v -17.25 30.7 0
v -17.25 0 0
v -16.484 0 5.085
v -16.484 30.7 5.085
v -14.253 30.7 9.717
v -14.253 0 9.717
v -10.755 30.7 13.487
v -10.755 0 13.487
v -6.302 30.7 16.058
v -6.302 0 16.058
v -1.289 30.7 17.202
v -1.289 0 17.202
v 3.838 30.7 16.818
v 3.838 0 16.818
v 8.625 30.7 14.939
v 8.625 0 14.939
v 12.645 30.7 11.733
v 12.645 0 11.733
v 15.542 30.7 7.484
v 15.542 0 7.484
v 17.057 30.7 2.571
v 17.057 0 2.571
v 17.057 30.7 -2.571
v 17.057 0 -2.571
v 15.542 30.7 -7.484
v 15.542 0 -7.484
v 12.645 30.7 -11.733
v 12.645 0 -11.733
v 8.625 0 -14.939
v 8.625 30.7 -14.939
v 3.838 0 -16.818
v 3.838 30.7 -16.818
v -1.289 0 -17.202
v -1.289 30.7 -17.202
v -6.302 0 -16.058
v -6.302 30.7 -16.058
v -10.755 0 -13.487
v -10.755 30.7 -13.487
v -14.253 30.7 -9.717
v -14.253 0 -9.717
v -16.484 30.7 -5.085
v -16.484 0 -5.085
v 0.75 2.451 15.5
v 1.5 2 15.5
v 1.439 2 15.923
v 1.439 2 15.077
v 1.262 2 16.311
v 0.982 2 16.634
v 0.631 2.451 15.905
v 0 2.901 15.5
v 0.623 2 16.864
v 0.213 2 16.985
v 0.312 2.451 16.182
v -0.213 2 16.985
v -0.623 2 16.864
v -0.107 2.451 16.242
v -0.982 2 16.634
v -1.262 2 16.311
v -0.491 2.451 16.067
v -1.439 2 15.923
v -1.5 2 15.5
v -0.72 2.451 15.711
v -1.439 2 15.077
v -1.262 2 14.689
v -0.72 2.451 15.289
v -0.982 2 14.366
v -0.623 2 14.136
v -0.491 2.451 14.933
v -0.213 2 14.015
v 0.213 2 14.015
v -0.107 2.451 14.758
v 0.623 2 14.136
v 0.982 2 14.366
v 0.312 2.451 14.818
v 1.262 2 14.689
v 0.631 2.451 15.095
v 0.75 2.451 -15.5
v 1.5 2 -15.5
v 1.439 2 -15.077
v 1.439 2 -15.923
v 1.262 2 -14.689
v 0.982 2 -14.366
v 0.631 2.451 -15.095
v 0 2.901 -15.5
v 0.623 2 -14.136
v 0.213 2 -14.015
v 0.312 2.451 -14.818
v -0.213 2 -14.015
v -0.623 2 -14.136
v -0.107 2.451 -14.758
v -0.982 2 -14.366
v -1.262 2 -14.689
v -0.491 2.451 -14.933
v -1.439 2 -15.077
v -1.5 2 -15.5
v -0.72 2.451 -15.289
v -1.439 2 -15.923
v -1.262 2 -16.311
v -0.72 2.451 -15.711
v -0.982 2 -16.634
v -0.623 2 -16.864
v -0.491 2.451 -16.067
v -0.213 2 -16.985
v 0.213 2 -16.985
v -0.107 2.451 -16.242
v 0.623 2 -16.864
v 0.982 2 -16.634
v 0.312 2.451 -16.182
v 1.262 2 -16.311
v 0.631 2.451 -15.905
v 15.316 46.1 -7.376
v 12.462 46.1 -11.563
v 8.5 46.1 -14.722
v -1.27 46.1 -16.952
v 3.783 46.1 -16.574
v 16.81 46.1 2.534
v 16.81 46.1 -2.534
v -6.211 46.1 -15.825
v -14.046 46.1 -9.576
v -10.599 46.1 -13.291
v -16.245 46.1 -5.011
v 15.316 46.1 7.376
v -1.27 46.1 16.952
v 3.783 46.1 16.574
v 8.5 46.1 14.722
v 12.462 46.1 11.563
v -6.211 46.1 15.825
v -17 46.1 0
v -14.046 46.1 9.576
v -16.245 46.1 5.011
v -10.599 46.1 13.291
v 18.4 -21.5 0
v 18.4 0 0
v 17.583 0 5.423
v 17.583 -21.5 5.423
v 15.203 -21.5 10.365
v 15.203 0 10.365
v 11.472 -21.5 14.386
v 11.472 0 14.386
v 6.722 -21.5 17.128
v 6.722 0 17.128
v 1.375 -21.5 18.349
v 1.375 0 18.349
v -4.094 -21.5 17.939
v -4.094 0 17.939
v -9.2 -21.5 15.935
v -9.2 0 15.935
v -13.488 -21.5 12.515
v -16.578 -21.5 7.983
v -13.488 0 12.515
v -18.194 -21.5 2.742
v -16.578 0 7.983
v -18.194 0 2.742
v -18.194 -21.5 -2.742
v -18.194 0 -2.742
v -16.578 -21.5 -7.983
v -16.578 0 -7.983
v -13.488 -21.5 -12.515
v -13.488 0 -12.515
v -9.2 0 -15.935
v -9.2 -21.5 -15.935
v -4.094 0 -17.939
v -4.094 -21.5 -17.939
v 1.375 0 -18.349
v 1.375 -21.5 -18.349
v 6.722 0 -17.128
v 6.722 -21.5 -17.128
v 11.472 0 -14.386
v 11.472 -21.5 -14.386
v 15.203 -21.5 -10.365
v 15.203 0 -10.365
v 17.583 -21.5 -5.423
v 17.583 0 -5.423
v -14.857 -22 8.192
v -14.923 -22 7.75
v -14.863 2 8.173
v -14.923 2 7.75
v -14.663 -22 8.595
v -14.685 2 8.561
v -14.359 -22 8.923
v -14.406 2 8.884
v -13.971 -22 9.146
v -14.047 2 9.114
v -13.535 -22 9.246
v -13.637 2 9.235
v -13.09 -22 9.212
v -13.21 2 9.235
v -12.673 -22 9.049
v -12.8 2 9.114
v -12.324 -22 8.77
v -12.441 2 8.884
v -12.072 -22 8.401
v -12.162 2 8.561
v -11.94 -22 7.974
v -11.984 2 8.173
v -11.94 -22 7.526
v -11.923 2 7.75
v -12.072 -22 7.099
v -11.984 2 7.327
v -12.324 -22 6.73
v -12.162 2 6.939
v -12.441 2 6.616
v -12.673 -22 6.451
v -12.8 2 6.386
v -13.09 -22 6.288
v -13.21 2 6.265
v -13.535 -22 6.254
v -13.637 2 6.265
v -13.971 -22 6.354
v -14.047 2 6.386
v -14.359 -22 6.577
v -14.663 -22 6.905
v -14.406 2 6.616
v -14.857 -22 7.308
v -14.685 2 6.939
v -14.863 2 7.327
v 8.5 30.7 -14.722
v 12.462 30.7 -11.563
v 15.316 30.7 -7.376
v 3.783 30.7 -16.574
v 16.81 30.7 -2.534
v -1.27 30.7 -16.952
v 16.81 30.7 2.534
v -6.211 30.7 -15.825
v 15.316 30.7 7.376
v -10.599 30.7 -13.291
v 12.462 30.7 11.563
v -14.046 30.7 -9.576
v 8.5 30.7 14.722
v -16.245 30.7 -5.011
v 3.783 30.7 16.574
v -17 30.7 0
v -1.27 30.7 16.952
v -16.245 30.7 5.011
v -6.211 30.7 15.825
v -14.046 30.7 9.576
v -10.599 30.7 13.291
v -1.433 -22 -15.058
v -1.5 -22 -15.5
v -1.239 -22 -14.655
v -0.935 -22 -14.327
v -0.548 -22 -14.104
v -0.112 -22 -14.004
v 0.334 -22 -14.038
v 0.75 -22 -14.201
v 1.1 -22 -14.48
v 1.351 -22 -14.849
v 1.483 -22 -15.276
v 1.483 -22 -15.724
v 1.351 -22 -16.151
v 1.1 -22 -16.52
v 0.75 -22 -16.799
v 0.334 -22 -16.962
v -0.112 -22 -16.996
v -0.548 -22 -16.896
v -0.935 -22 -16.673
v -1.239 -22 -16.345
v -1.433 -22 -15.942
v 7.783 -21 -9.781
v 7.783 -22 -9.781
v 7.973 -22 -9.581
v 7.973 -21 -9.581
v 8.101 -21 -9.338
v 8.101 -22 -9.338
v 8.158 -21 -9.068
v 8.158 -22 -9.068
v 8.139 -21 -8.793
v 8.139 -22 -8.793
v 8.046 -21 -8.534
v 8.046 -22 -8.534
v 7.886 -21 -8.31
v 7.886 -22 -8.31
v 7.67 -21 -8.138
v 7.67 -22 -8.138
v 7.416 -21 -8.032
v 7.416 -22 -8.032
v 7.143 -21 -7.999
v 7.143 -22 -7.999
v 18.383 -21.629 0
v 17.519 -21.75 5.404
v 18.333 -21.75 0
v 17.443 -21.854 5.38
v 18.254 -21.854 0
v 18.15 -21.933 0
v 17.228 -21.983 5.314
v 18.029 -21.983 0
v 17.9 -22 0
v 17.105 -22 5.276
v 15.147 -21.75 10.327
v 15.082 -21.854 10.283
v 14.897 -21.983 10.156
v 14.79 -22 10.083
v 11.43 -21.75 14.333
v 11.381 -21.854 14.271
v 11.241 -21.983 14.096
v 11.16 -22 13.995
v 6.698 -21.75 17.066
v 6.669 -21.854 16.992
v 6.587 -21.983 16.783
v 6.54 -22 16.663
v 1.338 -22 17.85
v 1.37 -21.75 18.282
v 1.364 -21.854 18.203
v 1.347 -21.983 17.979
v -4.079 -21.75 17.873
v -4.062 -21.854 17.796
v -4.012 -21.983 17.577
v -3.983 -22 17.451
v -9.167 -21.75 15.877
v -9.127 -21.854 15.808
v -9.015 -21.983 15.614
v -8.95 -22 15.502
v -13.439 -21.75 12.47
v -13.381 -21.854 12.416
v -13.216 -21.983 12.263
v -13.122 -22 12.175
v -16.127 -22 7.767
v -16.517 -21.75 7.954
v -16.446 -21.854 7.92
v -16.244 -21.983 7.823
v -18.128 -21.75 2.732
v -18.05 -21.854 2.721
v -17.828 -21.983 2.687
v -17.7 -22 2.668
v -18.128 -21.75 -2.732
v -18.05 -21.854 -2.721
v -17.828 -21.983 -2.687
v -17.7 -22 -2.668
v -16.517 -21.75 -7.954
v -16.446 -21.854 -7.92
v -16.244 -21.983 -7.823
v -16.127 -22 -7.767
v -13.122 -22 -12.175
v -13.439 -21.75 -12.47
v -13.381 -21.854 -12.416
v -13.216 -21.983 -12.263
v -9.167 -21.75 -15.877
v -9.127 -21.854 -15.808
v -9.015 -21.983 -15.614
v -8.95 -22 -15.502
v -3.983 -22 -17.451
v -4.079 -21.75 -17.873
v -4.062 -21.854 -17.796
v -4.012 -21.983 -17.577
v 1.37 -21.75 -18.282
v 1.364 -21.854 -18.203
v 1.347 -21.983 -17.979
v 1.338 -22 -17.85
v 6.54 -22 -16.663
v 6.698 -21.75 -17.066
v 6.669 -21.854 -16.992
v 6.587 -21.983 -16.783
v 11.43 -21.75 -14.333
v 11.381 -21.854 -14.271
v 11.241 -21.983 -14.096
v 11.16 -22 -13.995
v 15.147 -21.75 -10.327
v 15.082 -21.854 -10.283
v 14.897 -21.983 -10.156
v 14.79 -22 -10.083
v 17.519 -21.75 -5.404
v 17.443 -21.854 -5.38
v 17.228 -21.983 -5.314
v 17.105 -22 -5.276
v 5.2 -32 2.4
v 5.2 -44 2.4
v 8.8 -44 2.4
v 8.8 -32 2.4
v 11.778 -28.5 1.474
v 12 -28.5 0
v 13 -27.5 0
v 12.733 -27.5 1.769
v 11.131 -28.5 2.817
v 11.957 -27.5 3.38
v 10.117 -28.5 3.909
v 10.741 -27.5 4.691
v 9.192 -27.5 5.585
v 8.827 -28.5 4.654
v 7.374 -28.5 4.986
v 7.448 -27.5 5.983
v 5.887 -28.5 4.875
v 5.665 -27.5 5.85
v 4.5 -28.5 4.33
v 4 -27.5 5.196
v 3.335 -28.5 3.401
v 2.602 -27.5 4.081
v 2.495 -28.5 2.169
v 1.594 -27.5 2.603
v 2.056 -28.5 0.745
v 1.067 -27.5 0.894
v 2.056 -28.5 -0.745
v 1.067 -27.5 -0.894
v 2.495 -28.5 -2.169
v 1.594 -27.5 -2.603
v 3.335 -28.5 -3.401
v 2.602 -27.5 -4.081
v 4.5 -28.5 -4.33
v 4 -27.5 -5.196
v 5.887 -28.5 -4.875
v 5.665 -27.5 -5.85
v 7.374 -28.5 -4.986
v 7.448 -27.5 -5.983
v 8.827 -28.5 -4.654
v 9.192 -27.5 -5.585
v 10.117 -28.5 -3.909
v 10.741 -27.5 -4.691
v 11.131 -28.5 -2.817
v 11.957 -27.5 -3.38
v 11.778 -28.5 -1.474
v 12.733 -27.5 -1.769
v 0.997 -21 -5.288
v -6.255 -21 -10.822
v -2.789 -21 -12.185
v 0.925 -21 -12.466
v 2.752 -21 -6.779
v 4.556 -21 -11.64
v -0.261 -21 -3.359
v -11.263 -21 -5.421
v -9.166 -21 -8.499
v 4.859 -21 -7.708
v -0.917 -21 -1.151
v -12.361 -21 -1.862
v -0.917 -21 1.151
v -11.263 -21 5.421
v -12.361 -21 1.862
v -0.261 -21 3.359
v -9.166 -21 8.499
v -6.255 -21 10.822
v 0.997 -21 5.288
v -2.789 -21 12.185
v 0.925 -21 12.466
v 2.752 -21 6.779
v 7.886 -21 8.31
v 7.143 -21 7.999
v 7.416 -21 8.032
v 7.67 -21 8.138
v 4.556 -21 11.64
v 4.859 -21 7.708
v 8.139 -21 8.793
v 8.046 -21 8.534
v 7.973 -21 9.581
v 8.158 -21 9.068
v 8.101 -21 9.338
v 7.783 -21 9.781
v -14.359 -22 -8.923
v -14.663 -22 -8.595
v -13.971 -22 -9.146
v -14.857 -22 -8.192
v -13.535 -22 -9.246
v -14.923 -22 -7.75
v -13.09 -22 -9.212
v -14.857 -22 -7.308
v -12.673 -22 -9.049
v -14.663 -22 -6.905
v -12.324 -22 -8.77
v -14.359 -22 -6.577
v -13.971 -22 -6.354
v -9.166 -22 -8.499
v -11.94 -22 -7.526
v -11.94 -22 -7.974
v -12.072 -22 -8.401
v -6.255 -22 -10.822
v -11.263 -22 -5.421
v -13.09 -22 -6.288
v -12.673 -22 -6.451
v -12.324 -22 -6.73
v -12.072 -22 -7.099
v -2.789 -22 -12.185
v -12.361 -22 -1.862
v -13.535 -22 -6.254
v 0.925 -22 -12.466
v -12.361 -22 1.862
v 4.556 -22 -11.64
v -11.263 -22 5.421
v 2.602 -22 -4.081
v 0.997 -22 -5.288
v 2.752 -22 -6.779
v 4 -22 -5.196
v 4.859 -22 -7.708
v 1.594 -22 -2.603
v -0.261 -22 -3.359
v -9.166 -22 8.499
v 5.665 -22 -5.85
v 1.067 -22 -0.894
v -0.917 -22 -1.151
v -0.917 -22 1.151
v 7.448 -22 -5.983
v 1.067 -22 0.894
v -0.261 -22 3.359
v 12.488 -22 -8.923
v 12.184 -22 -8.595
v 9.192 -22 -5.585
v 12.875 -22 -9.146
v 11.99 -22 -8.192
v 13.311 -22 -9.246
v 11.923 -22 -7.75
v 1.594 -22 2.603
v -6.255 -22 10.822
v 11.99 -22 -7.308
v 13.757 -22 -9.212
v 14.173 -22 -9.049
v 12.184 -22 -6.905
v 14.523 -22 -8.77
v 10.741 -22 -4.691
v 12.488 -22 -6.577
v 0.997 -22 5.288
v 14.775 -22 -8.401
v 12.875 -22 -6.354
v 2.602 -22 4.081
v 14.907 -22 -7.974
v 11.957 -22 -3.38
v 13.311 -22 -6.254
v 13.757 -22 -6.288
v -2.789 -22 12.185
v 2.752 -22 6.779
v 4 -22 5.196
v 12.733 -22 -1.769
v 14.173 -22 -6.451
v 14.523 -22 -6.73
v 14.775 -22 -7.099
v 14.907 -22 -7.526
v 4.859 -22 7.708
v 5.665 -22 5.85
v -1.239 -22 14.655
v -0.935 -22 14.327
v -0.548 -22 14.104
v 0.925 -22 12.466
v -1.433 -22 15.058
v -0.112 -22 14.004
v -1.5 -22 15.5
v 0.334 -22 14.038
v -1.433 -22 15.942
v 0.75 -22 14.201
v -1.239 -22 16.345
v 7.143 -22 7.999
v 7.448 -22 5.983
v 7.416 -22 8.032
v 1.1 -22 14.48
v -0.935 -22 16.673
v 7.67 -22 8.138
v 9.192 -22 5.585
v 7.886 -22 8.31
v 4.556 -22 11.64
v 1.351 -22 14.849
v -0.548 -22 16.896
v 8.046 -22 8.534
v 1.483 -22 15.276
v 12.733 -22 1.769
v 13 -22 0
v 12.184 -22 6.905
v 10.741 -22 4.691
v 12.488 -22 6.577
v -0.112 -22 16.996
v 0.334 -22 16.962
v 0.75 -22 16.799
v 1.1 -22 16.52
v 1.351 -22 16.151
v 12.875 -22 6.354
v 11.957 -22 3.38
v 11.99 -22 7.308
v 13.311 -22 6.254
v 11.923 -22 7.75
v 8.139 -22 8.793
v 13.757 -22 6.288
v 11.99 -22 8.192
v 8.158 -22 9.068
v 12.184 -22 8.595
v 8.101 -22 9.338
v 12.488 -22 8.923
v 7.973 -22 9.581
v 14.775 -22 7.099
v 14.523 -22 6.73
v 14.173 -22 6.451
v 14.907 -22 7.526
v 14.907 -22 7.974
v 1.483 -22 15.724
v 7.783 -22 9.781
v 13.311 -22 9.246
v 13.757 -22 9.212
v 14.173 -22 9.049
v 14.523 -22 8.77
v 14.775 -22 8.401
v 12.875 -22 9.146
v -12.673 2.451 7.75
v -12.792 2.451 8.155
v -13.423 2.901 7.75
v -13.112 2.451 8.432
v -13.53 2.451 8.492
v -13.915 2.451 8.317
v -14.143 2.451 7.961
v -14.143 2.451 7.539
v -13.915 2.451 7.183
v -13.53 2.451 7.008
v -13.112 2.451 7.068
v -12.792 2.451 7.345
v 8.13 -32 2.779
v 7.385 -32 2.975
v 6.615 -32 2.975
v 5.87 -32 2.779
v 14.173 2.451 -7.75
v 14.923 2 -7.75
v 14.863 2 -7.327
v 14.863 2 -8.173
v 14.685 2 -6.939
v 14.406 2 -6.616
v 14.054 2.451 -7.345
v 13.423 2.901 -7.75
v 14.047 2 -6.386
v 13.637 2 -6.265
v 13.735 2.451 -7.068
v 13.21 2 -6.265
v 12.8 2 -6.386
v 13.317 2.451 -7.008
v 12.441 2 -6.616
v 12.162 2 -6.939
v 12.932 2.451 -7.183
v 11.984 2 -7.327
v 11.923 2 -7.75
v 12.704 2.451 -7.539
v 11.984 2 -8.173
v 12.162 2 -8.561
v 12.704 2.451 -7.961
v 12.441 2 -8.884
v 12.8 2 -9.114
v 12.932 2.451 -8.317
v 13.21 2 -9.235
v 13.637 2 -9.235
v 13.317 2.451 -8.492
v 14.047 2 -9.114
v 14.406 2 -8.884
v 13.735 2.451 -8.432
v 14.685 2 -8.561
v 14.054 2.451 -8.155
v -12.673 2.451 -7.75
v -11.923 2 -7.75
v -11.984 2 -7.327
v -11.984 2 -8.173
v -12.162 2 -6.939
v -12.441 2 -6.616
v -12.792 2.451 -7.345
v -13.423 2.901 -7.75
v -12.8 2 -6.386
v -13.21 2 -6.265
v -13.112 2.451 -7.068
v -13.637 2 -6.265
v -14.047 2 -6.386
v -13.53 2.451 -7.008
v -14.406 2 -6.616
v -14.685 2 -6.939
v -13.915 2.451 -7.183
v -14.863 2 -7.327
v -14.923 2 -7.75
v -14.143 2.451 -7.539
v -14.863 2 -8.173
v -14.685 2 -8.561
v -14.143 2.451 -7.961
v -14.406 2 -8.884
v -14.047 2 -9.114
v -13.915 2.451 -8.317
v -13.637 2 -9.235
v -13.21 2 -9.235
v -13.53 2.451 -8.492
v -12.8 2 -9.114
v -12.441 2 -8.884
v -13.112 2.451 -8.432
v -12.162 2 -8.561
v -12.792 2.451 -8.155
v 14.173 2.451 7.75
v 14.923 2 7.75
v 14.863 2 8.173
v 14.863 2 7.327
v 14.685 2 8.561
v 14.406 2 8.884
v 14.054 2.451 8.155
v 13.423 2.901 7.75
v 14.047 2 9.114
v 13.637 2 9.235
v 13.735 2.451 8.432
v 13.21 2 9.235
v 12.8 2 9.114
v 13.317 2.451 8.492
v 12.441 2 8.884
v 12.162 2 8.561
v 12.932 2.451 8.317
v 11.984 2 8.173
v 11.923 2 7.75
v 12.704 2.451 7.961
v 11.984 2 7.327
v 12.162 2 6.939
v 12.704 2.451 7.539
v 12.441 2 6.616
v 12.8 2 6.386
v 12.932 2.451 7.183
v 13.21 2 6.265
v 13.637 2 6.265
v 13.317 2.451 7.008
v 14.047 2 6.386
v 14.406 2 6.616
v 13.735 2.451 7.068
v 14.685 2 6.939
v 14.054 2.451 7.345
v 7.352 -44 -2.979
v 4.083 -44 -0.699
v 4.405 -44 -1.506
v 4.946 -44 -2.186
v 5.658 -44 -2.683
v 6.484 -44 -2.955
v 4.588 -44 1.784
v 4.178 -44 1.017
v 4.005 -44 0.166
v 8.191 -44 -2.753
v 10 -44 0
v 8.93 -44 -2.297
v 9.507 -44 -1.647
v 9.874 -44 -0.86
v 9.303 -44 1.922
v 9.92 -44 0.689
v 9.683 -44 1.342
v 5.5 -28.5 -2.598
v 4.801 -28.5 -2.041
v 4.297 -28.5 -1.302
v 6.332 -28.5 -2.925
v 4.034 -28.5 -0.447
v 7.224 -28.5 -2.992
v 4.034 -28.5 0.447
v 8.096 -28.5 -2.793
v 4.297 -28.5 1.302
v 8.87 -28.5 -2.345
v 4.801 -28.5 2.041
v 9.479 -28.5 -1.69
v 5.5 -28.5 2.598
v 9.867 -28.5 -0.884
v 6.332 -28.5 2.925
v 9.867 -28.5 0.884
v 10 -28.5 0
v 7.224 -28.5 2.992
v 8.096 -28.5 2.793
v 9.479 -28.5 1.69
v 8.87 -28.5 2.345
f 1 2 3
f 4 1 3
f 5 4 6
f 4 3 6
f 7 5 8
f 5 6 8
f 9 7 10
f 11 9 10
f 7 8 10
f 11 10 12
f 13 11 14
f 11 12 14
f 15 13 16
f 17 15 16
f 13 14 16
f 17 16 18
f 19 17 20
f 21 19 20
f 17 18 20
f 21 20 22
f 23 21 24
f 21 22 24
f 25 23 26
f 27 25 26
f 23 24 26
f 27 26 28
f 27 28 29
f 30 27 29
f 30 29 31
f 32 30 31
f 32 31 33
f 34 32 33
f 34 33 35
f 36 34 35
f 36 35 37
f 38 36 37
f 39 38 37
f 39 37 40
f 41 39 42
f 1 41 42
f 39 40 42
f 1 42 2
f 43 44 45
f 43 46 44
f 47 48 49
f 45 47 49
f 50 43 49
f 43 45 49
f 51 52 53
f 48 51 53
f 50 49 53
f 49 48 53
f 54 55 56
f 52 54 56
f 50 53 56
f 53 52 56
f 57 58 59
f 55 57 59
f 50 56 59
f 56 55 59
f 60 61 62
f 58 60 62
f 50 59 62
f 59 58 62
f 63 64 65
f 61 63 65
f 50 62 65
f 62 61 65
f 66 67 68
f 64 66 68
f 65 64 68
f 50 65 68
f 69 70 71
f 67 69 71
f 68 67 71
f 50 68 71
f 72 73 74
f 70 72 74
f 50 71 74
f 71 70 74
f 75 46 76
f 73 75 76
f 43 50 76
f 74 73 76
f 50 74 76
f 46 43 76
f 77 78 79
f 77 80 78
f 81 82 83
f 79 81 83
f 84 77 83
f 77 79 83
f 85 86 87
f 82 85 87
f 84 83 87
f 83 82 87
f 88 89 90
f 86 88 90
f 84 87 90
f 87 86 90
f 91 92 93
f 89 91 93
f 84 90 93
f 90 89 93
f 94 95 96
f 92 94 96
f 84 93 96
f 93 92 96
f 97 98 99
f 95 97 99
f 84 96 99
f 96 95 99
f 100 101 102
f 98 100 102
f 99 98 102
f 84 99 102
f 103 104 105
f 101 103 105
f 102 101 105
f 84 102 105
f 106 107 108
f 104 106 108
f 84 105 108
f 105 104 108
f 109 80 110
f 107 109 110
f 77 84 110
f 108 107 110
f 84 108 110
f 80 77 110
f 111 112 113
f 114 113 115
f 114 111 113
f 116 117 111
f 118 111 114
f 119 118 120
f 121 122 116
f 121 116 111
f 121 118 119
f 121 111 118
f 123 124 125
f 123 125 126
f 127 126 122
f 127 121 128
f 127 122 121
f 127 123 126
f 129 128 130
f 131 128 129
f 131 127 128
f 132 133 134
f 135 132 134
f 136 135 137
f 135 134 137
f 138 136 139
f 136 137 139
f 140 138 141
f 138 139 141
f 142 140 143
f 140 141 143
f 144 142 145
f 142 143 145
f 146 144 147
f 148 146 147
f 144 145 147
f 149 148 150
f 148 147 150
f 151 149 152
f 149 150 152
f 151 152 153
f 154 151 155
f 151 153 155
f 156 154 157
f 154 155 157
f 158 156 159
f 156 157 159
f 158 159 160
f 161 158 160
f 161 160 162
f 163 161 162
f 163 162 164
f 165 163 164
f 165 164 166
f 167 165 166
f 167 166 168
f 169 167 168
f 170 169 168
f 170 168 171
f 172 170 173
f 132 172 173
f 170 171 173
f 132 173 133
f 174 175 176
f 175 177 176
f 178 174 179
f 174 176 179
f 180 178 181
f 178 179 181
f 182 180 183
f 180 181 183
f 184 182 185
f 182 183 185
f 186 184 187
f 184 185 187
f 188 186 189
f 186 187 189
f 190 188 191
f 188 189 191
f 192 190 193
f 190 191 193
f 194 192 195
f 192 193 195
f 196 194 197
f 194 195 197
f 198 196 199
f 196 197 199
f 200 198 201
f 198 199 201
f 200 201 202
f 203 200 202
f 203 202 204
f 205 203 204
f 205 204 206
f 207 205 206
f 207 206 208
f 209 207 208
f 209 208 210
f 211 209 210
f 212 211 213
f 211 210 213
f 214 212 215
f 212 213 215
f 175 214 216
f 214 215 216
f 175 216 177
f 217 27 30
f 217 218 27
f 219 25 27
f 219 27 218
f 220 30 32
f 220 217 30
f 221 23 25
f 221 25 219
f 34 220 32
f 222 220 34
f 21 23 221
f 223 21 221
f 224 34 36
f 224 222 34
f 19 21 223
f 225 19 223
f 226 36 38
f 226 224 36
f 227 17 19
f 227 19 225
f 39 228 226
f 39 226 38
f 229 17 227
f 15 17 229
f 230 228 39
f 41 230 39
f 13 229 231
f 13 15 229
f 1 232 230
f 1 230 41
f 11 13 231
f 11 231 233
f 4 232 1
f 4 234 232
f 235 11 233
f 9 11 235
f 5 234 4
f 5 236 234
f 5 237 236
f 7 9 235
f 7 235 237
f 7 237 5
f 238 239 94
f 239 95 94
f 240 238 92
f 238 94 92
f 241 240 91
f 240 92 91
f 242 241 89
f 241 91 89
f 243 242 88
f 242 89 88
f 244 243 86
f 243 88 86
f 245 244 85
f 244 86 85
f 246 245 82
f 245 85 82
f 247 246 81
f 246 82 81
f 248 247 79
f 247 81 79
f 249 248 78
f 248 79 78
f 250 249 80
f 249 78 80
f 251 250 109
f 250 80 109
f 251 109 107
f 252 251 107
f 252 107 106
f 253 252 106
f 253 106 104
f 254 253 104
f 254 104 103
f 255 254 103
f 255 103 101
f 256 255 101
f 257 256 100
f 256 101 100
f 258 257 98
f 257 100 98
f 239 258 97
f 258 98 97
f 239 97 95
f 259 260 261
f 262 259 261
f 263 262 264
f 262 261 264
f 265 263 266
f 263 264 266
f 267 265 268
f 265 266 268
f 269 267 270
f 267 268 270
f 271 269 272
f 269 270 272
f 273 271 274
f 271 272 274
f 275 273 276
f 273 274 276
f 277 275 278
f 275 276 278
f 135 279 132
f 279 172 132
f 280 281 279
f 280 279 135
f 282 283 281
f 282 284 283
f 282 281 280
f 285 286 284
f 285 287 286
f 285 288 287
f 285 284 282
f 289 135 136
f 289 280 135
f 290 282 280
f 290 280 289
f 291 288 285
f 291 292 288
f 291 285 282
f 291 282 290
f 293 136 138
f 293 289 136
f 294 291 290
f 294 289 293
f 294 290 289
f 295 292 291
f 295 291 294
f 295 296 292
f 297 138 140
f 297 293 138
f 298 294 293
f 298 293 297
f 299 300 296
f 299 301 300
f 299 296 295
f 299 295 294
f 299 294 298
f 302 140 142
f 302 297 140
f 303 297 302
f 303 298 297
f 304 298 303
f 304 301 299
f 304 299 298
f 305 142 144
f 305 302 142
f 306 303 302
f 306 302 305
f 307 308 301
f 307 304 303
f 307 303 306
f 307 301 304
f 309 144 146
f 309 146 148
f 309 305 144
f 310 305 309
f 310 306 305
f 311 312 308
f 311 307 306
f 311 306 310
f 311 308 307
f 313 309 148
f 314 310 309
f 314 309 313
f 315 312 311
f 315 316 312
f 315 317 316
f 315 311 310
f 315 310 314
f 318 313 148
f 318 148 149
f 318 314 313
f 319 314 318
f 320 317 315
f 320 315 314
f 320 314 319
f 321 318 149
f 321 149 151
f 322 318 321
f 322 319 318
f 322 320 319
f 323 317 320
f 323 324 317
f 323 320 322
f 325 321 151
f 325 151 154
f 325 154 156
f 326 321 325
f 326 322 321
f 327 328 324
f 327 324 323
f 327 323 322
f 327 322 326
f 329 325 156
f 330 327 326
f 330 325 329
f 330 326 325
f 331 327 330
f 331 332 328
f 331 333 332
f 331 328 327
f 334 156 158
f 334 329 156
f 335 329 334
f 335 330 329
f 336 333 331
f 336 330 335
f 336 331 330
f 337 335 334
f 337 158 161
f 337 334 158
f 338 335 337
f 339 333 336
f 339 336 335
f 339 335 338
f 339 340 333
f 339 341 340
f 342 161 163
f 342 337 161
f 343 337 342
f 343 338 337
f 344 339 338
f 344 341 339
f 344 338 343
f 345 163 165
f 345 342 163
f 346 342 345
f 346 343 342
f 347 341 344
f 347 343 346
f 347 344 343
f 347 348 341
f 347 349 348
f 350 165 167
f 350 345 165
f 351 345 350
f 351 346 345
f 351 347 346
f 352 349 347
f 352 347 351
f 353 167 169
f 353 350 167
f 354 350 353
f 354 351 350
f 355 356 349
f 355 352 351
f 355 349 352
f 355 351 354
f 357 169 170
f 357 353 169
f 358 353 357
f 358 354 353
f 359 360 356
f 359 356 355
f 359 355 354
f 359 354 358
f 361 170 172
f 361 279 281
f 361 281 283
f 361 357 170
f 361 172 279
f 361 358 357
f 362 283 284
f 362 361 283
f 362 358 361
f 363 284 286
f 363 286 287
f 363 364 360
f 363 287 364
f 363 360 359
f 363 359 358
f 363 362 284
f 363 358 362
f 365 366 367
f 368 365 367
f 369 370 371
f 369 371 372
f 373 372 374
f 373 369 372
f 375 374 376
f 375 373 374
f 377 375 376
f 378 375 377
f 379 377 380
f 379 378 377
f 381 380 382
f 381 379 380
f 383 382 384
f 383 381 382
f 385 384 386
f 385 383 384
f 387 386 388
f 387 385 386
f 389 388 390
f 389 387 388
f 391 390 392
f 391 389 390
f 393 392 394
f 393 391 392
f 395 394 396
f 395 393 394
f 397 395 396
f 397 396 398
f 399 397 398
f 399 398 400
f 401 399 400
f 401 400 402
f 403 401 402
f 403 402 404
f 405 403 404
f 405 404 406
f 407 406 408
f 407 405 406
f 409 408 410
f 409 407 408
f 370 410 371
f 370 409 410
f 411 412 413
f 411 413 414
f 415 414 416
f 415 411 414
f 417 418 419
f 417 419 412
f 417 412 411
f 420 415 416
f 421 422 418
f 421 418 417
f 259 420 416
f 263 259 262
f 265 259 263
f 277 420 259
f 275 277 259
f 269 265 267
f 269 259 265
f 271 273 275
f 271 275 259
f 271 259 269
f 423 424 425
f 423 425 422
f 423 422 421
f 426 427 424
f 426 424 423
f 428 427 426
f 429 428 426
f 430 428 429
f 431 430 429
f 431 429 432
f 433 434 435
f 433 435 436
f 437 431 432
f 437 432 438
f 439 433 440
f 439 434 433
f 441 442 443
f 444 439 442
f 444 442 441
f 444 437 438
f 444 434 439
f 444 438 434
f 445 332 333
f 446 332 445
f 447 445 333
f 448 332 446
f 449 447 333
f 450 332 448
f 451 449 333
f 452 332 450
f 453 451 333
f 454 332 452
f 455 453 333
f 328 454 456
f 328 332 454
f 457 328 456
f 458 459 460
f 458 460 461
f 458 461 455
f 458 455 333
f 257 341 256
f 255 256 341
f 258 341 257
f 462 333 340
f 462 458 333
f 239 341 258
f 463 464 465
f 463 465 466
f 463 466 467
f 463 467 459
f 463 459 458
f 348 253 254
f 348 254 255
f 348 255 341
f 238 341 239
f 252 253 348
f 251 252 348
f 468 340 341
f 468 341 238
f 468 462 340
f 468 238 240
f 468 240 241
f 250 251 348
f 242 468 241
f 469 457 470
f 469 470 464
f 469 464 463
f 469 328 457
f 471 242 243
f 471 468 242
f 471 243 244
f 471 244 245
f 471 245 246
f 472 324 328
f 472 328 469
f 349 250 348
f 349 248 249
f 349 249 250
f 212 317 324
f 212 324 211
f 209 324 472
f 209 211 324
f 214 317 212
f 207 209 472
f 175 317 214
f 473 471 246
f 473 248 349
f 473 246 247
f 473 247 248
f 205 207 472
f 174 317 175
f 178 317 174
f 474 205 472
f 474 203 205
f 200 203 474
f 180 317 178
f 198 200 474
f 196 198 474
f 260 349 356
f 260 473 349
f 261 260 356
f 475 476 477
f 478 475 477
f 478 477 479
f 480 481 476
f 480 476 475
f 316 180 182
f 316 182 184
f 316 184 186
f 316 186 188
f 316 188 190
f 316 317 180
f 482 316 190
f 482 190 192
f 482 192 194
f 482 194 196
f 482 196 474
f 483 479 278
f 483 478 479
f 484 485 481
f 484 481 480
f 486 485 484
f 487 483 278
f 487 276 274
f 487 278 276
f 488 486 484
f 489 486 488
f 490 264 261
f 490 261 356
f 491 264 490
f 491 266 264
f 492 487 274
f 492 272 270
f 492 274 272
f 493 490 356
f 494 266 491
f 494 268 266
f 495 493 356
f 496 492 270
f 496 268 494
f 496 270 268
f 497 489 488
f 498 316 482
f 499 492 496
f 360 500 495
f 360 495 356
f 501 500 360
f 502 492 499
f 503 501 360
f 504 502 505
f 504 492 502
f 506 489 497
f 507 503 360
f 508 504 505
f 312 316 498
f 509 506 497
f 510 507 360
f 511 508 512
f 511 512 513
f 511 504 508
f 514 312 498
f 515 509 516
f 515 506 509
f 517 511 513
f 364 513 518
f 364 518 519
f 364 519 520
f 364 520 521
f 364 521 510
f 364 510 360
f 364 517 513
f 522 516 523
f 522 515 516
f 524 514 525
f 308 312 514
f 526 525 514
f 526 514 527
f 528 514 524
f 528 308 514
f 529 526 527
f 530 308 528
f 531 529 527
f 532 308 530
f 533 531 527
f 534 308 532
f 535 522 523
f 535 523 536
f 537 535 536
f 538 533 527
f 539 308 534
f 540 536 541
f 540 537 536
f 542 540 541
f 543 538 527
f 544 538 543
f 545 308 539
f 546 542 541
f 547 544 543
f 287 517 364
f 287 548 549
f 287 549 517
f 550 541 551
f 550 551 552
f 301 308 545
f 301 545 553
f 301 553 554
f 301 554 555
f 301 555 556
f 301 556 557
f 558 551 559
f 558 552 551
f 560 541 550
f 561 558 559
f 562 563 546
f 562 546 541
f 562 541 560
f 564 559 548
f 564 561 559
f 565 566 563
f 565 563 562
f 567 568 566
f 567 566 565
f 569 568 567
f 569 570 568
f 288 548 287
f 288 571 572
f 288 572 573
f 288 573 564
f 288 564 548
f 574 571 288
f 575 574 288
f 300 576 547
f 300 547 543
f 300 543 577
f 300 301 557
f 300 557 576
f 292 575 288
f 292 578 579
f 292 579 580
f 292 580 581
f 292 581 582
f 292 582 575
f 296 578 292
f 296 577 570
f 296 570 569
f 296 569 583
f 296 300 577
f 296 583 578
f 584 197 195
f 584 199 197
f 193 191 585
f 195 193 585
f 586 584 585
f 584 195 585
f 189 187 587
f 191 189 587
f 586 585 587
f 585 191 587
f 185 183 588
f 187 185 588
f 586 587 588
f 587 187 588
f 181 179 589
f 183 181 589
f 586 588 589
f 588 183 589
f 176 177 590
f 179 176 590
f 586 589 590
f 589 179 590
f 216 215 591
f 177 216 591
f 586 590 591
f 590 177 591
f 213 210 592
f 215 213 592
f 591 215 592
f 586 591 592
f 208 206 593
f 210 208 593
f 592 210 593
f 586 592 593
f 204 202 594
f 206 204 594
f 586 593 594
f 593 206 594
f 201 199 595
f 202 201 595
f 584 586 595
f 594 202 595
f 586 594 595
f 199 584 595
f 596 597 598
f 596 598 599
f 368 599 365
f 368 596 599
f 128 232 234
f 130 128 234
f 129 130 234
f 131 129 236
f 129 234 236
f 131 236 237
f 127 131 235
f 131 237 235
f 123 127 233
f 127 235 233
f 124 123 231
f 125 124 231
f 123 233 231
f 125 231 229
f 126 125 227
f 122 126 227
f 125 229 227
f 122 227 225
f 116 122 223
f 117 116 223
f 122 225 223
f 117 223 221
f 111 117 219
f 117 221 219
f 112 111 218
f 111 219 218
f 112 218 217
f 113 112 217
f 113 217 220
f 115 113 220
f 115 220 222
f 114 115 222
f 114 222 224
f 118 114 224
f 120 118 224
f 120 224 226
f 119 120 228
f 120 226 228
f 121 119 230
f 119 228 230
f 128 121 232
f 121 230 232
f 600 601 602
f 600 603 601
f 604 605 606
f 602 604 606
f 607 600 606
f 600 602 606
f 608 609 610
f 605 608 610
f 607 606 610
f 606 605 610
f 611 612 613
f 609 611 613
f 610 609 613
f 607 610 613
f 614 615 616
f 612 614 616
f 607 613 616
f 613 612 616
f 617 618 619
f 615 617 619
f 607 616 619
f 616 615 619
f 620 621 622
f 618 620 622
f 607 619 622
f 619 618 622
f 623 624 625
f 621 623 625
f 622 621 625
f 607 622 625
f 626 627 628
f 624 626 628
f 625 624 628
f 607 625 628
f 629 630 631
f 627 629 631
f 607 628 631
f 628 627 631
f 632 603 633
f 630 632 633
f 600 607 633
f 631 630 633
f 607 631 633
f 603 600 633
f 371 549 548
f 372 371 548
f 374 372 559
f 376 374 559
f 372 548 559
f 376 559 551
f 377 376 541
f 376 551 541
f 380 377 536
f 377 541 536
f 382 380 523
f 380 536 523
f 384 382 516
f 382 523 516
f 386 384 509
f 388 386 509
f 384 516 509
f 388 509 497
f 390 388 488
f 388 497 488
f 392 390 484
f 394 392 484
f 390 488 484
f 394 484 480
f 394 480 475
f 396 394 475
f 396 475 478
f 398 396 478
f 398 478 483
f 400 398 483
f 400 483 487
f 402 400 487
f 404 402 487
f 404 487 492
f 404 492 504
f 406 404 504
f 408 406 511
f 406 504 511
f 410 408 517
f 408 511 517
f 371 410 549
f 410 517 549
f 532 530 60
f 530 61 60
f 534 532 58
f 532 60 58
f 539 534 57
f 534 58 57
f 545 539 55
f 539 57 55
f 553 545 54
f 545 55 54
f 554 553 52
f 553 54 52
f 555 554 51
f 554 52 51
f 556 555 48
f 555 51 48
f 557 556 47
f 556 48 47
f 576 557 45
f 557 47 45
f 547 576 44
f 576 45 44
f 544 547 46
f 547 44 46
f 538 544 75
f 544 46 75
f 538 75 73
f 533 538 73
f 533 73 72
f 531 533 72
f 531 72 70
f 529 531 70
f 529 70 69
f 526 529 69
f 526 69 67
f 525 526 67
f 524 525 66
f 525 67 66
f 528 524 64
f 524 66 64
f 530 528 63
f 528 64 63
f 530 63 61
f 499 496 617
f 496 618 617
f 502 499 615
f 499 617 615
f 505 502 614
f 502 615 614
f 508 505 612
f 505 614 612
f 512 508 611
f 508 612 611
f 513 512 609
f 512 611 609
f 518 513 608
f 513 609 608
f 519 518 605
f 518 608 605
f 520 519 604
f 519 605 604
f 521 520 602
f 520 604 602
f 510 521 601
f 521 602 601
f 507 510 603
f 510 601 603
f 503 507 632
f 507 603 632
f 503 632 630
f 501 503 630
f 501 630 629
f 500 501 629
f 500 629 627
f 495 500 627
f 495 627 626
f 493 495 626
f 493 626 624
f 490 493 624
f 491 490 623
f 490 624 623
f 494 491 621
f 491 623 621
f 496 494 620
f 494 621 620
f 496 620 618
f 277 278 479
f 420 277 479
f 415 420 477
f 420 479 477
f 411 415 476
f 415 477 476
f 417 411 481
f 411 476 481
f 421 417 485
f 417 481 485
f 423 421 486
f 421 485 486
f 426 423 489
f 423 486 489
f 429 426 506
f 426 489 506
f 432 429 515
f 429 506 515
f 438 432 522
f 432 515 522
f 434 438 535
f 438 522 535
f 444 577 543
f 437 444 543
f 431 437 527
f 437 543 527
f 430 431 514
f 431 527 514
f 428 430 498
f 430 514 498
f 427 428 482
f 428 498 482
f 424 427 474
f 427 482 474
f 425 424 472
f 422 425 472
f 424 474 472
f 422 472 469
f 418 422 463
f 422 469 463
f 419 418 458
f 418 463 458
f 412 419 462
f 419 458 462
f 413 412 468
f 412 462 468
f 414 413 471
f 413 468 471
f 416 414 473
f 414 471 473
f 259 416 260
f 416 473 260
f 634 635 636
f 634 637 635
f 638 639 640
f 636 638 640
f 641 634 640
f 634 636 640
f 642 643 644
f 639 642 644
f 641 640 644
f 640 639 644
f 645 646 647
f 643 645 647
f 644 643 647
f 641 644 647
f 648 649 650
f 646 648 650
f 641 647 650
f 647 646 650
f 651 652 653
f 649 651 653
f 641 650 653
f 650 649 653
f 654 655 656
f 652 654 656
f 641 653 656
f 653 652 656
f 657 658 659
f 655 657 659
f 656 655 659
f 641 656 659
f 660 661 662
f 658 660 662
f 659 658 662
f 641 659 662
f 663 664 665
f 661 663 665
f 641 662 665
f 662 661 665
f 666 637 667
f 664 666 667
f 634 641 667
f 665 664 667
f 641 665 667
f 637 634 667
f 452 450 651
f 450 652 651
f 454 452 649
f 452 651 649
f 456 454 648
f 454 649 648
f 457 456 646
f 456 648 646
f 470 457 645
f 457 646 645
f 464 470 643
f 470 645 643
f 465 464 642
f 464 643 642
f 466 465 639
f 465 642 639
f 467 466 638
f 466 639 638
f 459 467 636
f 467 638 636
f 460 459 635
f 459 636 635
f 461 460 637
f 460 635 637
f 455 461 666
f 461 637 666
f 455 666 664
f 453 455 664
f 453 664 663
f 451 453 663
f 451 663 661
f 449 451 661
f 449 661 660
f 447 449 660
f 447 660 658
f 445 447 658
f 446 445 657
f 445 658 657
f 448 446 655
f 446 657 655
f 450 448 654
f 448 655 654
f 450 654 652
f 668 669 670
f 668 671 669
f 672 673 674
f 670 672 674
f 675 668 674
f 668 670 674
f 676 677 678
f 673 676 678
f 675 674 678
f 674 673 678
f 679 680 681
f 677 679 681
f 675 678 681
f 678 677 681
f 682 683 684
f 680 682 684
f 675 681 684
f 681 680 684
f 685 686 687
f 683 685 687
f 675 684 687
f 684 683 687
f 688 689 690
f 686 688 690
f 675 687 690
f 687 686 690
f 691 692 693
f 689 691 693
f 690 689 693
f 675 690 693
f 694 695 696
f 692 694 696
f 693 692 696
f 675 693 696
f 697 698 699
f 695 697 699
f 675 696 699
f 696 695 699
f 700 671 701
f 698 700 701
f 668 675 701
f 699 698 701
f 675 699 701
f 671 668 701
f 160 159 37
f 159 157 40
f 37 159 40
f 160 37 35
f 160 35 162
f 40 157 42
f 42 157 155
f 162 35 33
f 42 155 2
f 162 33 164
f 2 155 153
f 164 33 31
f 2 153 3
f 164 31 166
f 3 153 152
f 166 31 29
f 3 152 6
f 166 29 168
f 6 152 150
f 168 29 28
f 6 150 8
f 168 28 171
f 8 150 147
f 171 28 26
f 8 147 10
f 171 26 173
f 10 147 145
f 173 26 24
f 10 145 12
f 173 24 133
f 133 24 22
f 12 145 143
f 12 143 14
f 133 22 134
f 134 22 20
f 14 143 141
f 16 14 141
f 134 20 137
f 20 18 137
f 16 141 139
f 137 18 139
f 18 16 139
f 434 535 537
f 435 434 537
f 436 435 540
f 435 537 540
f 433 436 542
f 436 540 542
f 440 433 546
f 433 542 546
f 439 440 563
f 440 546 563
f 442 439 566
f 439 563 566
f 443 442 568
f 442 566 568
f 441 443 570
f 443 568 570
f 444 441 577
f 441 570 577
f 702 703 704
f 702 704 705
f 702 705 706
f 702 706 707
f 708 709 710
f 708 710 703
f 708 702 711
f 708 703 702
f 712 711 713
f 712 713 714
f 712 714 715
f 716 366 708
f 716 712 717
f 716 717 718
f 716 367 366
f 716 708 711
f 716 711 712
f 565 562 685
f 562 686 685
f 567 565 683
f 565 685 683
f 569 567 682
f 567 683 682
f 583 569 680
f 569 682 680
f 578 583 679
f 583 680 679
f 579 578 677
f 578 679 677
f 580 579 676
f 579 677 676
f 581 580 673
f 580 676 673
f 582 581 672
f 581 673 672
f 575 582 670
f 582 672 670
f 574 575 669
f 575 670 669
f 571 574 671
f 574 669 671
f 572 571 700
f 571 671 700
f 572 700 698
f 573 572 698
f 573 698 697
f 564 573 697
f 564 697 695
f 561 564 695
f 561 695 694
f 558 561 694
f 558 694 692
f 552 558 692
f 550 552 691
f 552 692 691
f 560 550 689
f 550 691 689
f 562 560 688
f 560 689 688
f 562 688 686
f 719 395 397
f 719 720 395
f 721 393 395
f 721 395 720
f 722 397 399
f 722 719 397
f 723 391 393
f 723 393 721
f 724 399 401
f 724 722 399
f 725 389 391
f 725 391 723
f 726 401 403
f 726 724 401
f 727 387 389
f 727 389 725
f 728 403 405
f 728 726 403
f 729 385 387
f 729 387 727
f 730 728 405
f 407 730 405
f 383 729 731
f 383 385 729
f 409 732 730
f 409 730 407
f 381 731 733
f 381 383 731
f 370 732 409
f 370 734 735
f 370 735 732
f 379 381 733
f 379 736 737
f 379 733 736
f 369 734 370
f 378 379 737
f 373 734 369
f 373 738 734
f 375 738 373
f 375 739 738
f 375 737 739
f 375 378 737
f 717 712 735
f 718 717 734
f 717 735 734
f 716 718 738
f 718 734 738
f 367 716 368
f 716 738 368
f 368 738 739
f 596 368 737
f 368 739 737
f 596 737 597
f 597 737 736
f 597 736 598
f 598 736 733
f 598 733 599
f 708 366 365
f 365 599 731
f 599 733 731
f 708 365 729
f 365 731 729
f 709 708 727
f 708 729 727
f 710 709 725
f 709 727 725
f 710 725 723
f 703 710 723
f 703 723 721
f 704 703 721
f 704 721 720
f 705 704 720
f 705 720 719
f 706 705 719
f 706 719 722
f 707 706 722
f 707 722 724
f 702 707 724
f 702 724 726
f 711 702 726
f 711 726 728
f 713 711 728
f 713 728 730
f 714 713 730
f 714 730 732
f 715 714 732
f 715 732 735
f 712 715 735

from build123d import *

# Parameters (mm, degrees)
F0_R      = 18.4
F1_DEPTH  = 22
F2_R      = 17.25
F3_DEPTH  = 30.7
F4_R      = 6
F5_DEPTH  = 6.5
F6_R      = 3
F7_DEPTH  = 15.5
F8_SIZE   = 1
F10_DEPTH = 12
F12_D     = 3
F12_DEPTH = 24
F12_TIP   = 0.9012909285
F14_DEPTH = 1
F15_R     = 6.5
F16_DEPTH = 1.5
F17_SIZE  = 1
F18_W     = 3.175
F18_H     = 0.79375
F19_DEPTH = 5.6
F20_SIZE  = 1
F22_DEPTH = 25.4
F23_R     = 0.5
F24_R     = 17
F25_DEPTH = 15.4


with BuildPart() as f1:
    # F0 (on Front) → F1 (new body)
    with BuildSketch(Plane.XZ):
        Circle(F0_R)
    extrude(amount=F1_DEPTH)

    # F2 (on face) → F3 (join)
    with BuildSketch(Plane(origin=(0, 0, 0), x_dir=(-1, 0, 0), z_dir=(0, 1, 0))):
        Circle(F2_R)
    extrude(amount=F3_DEPTH)

    # F4 (on face) → F5 (join)
    with BuildSketch(Plane.XZ.offset(22)):
        with Locations((7, 0)):
            Circle(F4_R)
    extrude(amount=F5_DEPTH)

    # F6 (on face) → F7 (join)
    with BuildSketch(Plane.XZ.offset(28.5)):
        with Locations((7, 0)):
            Circle(F6_R)
    extrude(amount=F7_DEPTH)

    # F8
    f8_edges = [f1.edges().sort_by_distance(p)[0] for p in [
        (1, -28.5, 0),
    ]]
    chamfer(f8_edges, length=F8_SIZE)

    # F9 (on face) → F10 (cut)
    with BuildSketch(Plane.XZ.offset(44)):
        with BuildLine():
            ThreePointArc((8.8, 2.4), (7, 3), (5.2, 2.4))
            Line((5.2, 2.4), (8.8, 2.4))
        make_face()
    extrude(amount=-F10_DEPTH, mode=Mode.SUBTRACT)

    # F12
    with Locations(Plane.XZ.offset(22)):
        with Locations((0, 15.5), (-13.4233937587, 7.75), (-13.4233937587, -7.75), (0, -15.5), (13.4233937587, -7.75), (13.4233937587, 7.75)):
            Hole(F12_D / 2, depth=F12_DEPTH)
            with Locations((0, 0, -(F12_DEPTH + F12_TIP / 2))):  # 118° drill point
                Cone(0, F12_D / 2, F12_TIP, mode=Mode.SUBTRACT)

    # F13 (on face) → F14 (cut)
    with BuildSketch(Plane.XZ.offset(22)):
        with BuildLine():
            ThreePointArc((7.1428571429, 7.9987243881), (8.1017881451, 8.6603638261), (7.7833850932, 9.7810488441))
            ThreePointArc((7.7833850932, 9.7810488441), (-12.5, 0), (7.7833850932, -9.7810488441))
            ThreePointArc((7.7833850932, -9.7810488441), (8.1017881451, -8.6603638261), (7.1428571429, -7.9987243881))
            ThreePointArc((7.1428571429, -7.9987243881), (-1, 0), (7.1428571429, 7.9987243881))
        make_face()
    extrude(amount=-F14_DEPTH, mode=Mode.SUBTRACT)

    # F15 (on face) → F16 (join)
    with BuildSketch(Plane(origin=(0, 30.7, 0), x_dir=(-1, 0, 0), z_dir=(0, 1, 0))):
        Circle(F15_R)
    extrude(amount=F16_DEPTH)

    # F17
    f17_edges = [f1.edges().sort_by_distance(p)[0] for p in [
        (6.5, 32.2, 0),
    ]]
    chamfer(f17_edges, length=F17_SIZE)

    # F18 (on face) → F19 (join)
    with BuildSketch(Plane(origin=(0, 30.7, 0), x_dir=(-1, 0, 0), z_dir=(0, 1, 0))):
        with Locations((0, 11.653125)):
            Rectangle(F18_W, F18_H)
        with Locations((0, -11.653125)):
            Rectangle(F18_W, F18_H)
    extrude(amount=F19_DEPTH)

    # F20
    f20_edges = [f1.edges().sort_by_distance(p)[0] for p in [
        (-1.5875, 36.3, 11.653125),
        (1.5875, 36.3, 11.653125),
        (1.5875, 36.3, -11.653125),
        (-1.5875, 36.3, -11.653125),
    ]]
    chamfer(f20_edges, length=F20_SIZE)

    # F21 (on face) → F22 (cut)
    with BuildSketch(Plane.XY.offset(12.05)):
        with BuildLine():
            Line((0.5, 33.74), (0.5, 35.01))
            ThreePointArc((0.5, 35.01), (0, 35.51), (-0.5, 35.01))
            Line((-0.5, 35.01), (-0.5, 33.74))
            ThreePointArc((-0.5, 33.74), (0, 33.24), (0.5, 33.74))
        make_face()
    extrude(amount=-F22_DEPTH, mode=Mode.SUBTRACT)

    # F23
    f23_edges = [f1.edges().sort_by_distance(p)[0] for p in [
        (-18.4, -22, 0),
    ]]
    fillet(f23_edges, radius=F23_R)

    # F24 (on face) → F25 (join)
    with BuildSketch(Plane(origin=(0, 30.7, 0), x_dir=(-1, 0, 0), z_dir=(0, 1, 0))):
        Circle(F24_R)
    extrude(amount=F25_DEPTH)


solid = f1.part
